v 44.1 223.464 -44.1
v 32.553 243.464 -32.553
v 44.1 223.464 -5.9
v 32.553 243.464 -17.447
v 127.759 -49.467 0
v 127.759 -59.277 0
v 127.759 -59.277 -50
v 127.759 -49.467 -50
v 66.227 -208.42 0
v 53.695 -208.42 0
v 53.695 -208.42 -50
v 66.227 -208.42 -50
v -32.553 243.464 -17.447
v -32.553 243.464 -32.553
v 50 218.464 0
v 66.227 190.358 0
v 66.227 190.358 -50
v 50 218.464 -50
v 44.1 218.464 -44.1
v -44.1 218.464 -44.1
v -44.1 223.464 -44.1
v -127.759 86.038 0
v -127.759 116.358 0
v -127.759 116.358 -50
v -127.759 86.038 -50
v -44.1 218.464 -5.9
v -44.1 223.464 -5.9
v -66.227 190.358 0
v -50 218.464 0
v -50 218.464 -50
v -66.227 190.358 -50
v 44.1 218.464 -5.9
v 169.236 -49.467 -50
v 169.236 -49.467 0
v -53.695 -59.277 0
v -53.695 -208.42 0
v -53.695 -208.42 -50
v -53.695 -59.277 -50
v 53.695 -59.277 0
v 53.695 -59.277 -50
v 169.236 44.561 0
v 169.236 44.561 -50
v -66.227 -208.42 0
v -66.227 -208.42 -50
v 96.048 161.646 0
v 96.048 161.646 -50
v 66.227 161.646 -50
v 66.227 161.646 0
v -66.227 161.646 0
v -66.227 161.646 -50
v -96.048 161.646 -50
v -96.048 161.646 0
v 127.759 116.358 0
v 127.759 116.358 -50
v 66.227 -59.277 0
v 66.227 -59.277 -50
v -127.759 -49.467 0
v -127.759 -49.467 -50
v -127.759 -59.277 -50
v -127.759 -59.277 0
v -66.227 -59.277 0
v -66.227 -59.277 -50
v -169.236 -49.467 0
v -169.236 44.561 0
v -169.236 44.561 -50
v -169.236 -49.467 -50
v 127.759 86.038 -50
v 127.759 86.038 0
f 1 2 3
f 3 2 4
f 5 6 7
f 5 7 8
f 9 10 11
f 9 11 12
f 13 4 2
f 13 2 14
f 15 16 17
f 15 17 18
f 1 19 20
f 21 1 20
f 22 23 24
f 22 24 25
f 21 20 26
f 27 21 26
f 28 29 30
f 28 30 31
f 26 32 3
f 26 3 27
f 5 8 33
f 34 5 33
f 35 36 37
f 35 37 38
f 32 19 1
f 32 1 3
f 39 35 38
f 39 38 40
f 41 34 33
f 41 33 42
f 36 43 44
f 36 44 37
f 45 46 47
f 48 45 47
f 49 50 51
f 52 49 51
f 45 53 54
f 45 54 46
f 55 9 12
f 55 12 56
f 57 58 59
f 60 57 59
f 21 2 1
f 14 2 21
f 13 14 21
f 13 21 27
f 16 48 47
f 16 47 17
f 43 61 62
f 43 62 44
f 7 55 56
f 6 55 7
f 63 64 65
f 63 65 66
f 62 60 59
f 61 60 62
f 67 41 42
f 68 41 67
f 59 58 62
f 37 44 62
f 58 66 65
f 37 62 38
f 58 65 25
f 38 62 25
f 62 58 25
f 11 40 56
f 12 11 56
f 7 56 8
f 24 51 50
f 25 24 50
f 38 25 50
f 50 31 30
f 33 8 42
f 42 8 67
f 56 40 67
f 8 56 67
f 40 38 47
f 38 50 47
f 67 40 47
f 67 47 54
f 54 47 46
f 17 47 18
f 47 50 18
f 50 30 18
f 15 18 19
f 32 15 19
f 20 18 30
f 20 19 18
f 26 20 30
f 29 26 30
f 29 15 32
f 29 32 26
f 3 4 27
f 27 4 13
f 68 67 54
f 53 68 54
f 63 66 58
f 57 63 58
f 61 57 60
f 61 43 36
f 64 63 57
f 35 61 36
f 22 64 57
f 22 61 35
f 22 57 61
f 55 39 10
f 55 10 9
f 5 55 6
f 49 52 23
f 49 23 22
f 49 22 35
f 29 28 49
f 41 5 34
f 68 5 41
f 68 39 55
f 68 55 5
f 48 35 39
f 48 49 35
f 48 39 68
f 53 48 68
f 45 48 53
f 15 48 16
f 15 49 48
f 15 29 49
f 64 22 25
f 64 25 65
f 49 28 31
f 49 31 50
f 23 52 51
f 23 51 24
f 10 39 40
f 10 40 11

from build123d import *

# Parameters (mm, degrees)
F1_DEPTH = 50
F2_W     = 88.2
F2_H     = 38.2
F2_W_2   = 43.121268
F2_H_2   = 15.88
F3_DEPTH = 25
F4_SIZE2 = 11.547005
F4_SIZE  = 20


with BuildPart() as f1:
    # F0 (on Top) → F1 (new body)
    with BuildSketch(Plane.XY):
        Polygon((50, 218.464008), (0, 218.464008), (-50, 218.464008), (-66.227116, 190.357819), (-66.227116, 161.646203), (-66.227116, 0), (-66.227116, -59.276793), (-66.227116, -208.420123), (-53.694672, -208.420123), (-53.694672, -59.276793), (0, -59.276793), (53.694672, -59.276793), (53.694672, -208.420123), (66.227116, -208.420123), (66.227116, -59.276793), (66.227116, 0), (66.227116, 161.646203), (66.227116, 190.357819), align=None)
        Polygon((-66.227116, 0), (-66.227116, 161.646203), (-96.047964, 161.646203), (-127.75892, 116.358264), (-127.75892, 86.03783), (-127.75892, -49.467381), (-127.75892, -59.276793), (-66.227116, -59.276793), align=None)
        Polygon((-127.75892, -49.467381), (-127.75892, 86.03783), (-169.235751, 44.560999), (-169.235751, -49.467381), align=None)
        Polygon((96.047964, 161.646203), (66.227116, 161.646203), (66.227116, 0), (66.227116, -59.276793), (127.75892, -59.276793), (127.75892, -49.467381), (127.75892, 86.03783), (127.75892, 116.358264), align=None)
        Polygon((169.235751, 44.560999), (127.75892, 86.03783), (127.75892, -49.467381), (169.235751, -49.467381), align=None)
    extrude(amount=-F1_DEPTH)

    # F2 (on face) → F3 (join)
    with BuildSketch(Plane(origin=(0, 218.464008, 0), x_dir=(-1, 0, 0), z_dir=(0, 1, 0))):
        with Locations((0, -25)):
            Rectangle(F2_W, F2_H)
        with Locations((0, -25)):
            Rectangle(F2_W_2, F2_H_2, mode=Mode.SUBTRACT)
        with Locations((0, -25)):
            Rectangle(F2_W_2, F2_H_2)
    extrude(amount=F3_DEPTH)

    # F4
    f4_edges = [f1.edges().sort_by_distance(p)[0] for p in [
        (-44.1, 243.464008, -25),
        (0, 243.464008, -5.9),
        (44.1, 243.464008, -25),
        (0, 243.464008, -44.1),
    ]]
    chamfer(f4_edges, length=F4_SIZE, length2=F4_SIZE2)


solid = f1.part
